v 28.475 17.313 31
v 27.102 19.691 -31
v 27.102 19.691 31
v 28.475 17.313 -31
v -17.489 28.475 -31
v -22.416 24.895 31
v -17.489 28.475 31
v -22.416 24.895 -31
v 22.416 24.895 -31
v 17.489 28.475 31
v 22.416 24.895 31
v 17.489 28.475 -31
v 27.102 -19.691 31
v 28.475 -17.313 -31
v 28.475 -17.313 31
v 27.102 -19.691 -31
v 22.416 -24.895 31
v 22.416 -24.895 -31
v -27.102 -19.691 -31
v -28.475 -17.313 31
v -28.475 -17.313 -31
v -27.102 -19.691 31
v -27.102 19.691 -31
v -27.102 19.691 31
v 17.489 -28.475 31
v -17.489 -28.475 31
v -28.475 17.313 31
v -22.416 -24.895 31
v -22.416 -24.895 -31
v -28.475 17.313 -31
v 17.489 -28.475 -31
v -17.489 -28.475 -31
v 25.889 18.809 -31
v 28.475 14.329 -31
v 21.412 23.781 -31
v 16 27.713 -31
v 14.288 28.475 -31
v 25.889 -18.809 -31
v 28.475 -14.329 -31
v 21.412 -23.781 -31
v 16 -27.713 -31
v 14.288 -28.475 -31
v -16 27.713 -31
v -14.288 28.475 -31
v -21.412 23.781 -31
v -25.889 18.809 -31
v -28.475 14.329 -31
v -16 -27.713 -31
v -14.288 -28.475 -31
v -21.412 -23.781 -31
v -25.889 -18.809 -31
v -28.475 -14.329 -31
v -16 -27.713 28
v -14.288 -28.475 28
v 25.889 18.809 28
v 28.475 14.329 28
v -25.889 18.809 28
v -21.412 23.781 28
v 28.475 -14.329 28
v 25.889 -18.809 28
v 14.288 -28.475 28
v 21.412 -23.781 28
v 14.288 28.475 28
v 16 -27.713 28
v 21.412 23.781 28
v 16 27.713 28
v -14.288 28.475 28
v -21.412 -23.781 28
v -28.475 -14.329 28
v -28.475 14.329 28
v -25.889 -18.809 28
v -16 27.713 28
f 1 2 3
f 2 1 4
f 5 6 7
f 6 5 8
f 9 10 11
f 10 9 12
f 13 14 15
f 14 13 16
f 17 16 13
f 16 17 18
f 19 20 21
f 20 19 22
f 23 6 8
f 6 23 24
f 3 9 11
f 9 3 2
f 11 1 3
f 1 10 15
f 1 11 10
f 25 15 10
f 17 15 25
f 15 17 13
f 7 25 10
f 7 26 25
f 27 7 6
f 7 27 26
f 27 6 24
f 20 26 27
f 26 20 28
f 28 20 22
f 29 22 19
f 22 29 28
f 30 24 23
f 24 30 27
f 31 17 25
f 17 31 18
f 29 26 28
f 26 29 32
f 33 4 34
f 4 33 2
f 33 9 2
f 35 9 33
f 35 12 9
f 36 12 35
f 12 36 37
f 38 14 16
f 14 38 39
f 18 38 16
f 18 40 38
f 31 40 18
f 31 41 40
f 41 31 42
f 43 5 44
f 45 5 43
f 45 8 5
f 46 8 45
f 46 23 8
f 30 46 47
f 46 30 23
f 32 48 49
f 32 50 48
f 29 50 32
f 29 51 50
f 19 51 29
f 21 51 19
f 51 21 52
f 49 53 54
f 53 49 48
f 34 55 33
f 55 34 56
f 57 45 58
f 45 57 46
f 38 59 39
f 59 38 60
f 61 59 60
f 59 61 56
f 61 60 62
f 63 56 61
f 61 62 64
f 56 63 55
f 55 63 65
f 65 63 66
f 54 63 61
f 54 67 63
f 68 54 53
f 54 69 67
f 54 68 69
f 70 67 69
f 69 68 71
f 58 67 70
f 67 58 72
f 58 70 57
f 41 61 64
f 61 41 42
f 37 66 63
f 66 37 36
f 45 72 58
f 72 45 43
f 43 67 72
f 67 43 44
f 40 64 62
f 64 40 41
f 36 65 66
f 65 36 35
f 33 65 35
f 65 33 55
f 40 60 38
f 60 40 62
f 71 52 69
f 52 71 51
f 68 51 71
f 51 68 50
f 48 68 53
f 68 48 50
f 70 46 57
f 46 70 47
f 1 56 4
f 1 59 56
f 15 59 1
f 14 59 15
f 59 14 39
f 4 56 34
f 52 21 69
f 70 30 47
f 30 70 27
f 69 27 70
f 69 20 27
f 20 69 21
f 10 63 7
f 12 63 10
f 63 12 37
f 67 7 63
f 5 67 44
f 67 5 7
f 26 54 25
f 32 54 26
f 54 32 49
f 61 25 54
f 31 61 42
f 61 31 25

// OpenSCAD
canD = 67;
canH = 124;
wall = 3;
module can() {
	intersection() {
		difference() {
			cylinder(d = canD,h = canH/2, center = true);
			translate([0,0,-wall])cylinder(d = canD-wall, h = canH/2, center=true);
		}
		cube([canD*0.85,canD*0.85,canH], center=true);
	}
}
can();
//translate([0,0,-wall])cylinder(d = canD-wall, h = canH, center=true);
